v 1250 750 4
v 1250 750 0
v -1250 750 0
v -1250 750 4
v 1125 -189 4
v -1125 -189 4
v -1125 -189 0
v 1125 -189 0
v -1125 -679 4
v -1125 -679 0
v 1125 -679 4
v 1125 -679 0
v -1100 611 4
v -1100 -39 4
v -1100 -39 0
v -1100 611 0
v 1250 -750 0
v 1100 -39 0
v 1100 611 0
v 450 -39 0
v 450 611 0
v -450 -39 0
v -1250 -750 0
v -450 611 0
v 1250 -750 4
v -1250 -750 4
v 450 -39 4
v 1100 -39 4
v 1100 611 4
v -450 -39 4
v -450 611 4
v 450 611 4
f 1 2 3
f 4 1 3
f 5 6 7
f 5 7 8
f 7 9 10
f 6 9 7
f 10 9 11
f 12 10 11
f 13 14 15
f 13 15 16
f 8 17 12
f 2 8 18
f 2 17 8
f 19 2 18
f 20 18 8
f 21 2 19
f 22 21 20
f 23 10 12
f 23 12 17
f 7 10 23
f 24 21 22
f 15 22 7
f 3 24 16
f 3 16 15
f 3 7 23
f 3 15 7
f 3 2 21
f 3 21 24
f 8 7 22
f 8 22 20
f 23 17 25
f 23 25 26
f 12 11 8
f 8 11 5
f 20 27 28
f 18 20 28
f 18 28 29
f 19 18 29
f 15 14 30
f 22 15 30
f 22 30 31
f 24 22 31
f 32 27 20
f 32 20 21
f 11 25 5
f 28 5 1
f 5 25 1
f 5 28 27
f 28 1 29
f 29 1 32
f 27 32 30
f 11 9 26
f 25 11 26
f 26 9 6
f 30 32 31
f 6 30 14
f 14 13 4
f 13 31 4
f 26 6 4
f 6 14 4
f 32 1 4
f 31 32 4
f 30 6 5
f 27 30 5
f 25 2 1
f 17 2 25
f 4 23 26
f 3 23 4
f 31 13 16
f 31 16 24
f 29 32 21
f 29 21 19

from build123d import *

# Parameters (mm, degrees)
BOSS_EXTRUDE1_DEPTH = 4
SKETCH3_W           = 650
SKETCH3_H           = 650
SKETCH3_W_2         = 2250
SKETCH3_H_2         = 490
CUT_EXTRUDE1_DEPTH  = 1458.743461656


with BuildPart() as part:
    # Sketch1 → Boss-Extrude1 (new body)
    with BuildSketch(Plane.XY):
        Polygon((-1250, 750), (0, 750), (1250, 750), (1250, -750), (-1250, -750), align=None)
    extrude(amount=BOSS_EXTRUDE1_DEPTH)

    # Sketch3 → Cut-Extrude1 (cut, through all)
    with BuildSketch(Plane.XY.offset(4)):
        with Locations((-775, 286)):
            Rectangle(SKETCH3_W, SKETCH3_H)
        with Locations((775, 286)):
            Rectangle(SKETCH3_W, SKETCH3_H)
        with Locations((0, -434)):
            Rectangle(SKETCH3_W_2, SKETCH3_H_2)
    extrude(amount=-CUT_EXTRUDE1_DEPTH, mode=Mode.SUBTRACT)


solid = part.part
